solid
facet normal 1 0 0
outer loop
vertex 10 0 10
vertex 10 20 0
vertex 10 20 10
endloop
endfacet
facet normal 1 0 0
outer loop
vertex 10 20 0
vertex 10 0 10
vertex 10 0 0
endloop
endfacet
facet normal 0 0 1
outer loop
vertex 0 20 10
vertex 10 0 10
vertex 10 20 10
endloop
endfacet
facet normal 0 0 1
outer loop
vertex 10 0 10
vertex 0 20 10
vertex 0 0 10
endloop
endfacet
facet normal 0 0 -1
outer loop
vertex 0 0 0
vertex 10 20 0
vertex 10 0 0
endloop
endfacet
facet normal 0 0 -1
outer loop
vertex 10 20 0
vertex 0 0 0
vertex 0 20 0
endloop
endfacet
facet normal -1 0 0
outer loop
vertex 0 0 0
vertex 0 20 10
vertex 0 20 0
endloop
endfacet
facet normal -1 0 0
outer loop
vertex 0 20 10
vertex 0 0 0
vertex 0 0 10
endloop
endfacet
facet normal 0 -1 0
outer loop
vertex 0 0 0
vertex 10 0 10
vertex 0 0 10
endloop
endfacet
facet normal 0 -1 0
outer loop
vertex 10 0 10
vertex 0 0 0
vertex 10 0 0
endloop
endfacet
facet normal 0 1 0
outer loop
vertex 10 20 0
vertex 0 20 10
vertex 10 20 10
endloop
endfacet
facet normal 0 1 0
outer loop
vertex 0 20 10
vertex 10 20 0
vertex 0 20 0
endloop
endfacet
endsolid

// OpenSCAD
color("red") cube(10);
color("blue") translate([0,10,0]) cube(10);
